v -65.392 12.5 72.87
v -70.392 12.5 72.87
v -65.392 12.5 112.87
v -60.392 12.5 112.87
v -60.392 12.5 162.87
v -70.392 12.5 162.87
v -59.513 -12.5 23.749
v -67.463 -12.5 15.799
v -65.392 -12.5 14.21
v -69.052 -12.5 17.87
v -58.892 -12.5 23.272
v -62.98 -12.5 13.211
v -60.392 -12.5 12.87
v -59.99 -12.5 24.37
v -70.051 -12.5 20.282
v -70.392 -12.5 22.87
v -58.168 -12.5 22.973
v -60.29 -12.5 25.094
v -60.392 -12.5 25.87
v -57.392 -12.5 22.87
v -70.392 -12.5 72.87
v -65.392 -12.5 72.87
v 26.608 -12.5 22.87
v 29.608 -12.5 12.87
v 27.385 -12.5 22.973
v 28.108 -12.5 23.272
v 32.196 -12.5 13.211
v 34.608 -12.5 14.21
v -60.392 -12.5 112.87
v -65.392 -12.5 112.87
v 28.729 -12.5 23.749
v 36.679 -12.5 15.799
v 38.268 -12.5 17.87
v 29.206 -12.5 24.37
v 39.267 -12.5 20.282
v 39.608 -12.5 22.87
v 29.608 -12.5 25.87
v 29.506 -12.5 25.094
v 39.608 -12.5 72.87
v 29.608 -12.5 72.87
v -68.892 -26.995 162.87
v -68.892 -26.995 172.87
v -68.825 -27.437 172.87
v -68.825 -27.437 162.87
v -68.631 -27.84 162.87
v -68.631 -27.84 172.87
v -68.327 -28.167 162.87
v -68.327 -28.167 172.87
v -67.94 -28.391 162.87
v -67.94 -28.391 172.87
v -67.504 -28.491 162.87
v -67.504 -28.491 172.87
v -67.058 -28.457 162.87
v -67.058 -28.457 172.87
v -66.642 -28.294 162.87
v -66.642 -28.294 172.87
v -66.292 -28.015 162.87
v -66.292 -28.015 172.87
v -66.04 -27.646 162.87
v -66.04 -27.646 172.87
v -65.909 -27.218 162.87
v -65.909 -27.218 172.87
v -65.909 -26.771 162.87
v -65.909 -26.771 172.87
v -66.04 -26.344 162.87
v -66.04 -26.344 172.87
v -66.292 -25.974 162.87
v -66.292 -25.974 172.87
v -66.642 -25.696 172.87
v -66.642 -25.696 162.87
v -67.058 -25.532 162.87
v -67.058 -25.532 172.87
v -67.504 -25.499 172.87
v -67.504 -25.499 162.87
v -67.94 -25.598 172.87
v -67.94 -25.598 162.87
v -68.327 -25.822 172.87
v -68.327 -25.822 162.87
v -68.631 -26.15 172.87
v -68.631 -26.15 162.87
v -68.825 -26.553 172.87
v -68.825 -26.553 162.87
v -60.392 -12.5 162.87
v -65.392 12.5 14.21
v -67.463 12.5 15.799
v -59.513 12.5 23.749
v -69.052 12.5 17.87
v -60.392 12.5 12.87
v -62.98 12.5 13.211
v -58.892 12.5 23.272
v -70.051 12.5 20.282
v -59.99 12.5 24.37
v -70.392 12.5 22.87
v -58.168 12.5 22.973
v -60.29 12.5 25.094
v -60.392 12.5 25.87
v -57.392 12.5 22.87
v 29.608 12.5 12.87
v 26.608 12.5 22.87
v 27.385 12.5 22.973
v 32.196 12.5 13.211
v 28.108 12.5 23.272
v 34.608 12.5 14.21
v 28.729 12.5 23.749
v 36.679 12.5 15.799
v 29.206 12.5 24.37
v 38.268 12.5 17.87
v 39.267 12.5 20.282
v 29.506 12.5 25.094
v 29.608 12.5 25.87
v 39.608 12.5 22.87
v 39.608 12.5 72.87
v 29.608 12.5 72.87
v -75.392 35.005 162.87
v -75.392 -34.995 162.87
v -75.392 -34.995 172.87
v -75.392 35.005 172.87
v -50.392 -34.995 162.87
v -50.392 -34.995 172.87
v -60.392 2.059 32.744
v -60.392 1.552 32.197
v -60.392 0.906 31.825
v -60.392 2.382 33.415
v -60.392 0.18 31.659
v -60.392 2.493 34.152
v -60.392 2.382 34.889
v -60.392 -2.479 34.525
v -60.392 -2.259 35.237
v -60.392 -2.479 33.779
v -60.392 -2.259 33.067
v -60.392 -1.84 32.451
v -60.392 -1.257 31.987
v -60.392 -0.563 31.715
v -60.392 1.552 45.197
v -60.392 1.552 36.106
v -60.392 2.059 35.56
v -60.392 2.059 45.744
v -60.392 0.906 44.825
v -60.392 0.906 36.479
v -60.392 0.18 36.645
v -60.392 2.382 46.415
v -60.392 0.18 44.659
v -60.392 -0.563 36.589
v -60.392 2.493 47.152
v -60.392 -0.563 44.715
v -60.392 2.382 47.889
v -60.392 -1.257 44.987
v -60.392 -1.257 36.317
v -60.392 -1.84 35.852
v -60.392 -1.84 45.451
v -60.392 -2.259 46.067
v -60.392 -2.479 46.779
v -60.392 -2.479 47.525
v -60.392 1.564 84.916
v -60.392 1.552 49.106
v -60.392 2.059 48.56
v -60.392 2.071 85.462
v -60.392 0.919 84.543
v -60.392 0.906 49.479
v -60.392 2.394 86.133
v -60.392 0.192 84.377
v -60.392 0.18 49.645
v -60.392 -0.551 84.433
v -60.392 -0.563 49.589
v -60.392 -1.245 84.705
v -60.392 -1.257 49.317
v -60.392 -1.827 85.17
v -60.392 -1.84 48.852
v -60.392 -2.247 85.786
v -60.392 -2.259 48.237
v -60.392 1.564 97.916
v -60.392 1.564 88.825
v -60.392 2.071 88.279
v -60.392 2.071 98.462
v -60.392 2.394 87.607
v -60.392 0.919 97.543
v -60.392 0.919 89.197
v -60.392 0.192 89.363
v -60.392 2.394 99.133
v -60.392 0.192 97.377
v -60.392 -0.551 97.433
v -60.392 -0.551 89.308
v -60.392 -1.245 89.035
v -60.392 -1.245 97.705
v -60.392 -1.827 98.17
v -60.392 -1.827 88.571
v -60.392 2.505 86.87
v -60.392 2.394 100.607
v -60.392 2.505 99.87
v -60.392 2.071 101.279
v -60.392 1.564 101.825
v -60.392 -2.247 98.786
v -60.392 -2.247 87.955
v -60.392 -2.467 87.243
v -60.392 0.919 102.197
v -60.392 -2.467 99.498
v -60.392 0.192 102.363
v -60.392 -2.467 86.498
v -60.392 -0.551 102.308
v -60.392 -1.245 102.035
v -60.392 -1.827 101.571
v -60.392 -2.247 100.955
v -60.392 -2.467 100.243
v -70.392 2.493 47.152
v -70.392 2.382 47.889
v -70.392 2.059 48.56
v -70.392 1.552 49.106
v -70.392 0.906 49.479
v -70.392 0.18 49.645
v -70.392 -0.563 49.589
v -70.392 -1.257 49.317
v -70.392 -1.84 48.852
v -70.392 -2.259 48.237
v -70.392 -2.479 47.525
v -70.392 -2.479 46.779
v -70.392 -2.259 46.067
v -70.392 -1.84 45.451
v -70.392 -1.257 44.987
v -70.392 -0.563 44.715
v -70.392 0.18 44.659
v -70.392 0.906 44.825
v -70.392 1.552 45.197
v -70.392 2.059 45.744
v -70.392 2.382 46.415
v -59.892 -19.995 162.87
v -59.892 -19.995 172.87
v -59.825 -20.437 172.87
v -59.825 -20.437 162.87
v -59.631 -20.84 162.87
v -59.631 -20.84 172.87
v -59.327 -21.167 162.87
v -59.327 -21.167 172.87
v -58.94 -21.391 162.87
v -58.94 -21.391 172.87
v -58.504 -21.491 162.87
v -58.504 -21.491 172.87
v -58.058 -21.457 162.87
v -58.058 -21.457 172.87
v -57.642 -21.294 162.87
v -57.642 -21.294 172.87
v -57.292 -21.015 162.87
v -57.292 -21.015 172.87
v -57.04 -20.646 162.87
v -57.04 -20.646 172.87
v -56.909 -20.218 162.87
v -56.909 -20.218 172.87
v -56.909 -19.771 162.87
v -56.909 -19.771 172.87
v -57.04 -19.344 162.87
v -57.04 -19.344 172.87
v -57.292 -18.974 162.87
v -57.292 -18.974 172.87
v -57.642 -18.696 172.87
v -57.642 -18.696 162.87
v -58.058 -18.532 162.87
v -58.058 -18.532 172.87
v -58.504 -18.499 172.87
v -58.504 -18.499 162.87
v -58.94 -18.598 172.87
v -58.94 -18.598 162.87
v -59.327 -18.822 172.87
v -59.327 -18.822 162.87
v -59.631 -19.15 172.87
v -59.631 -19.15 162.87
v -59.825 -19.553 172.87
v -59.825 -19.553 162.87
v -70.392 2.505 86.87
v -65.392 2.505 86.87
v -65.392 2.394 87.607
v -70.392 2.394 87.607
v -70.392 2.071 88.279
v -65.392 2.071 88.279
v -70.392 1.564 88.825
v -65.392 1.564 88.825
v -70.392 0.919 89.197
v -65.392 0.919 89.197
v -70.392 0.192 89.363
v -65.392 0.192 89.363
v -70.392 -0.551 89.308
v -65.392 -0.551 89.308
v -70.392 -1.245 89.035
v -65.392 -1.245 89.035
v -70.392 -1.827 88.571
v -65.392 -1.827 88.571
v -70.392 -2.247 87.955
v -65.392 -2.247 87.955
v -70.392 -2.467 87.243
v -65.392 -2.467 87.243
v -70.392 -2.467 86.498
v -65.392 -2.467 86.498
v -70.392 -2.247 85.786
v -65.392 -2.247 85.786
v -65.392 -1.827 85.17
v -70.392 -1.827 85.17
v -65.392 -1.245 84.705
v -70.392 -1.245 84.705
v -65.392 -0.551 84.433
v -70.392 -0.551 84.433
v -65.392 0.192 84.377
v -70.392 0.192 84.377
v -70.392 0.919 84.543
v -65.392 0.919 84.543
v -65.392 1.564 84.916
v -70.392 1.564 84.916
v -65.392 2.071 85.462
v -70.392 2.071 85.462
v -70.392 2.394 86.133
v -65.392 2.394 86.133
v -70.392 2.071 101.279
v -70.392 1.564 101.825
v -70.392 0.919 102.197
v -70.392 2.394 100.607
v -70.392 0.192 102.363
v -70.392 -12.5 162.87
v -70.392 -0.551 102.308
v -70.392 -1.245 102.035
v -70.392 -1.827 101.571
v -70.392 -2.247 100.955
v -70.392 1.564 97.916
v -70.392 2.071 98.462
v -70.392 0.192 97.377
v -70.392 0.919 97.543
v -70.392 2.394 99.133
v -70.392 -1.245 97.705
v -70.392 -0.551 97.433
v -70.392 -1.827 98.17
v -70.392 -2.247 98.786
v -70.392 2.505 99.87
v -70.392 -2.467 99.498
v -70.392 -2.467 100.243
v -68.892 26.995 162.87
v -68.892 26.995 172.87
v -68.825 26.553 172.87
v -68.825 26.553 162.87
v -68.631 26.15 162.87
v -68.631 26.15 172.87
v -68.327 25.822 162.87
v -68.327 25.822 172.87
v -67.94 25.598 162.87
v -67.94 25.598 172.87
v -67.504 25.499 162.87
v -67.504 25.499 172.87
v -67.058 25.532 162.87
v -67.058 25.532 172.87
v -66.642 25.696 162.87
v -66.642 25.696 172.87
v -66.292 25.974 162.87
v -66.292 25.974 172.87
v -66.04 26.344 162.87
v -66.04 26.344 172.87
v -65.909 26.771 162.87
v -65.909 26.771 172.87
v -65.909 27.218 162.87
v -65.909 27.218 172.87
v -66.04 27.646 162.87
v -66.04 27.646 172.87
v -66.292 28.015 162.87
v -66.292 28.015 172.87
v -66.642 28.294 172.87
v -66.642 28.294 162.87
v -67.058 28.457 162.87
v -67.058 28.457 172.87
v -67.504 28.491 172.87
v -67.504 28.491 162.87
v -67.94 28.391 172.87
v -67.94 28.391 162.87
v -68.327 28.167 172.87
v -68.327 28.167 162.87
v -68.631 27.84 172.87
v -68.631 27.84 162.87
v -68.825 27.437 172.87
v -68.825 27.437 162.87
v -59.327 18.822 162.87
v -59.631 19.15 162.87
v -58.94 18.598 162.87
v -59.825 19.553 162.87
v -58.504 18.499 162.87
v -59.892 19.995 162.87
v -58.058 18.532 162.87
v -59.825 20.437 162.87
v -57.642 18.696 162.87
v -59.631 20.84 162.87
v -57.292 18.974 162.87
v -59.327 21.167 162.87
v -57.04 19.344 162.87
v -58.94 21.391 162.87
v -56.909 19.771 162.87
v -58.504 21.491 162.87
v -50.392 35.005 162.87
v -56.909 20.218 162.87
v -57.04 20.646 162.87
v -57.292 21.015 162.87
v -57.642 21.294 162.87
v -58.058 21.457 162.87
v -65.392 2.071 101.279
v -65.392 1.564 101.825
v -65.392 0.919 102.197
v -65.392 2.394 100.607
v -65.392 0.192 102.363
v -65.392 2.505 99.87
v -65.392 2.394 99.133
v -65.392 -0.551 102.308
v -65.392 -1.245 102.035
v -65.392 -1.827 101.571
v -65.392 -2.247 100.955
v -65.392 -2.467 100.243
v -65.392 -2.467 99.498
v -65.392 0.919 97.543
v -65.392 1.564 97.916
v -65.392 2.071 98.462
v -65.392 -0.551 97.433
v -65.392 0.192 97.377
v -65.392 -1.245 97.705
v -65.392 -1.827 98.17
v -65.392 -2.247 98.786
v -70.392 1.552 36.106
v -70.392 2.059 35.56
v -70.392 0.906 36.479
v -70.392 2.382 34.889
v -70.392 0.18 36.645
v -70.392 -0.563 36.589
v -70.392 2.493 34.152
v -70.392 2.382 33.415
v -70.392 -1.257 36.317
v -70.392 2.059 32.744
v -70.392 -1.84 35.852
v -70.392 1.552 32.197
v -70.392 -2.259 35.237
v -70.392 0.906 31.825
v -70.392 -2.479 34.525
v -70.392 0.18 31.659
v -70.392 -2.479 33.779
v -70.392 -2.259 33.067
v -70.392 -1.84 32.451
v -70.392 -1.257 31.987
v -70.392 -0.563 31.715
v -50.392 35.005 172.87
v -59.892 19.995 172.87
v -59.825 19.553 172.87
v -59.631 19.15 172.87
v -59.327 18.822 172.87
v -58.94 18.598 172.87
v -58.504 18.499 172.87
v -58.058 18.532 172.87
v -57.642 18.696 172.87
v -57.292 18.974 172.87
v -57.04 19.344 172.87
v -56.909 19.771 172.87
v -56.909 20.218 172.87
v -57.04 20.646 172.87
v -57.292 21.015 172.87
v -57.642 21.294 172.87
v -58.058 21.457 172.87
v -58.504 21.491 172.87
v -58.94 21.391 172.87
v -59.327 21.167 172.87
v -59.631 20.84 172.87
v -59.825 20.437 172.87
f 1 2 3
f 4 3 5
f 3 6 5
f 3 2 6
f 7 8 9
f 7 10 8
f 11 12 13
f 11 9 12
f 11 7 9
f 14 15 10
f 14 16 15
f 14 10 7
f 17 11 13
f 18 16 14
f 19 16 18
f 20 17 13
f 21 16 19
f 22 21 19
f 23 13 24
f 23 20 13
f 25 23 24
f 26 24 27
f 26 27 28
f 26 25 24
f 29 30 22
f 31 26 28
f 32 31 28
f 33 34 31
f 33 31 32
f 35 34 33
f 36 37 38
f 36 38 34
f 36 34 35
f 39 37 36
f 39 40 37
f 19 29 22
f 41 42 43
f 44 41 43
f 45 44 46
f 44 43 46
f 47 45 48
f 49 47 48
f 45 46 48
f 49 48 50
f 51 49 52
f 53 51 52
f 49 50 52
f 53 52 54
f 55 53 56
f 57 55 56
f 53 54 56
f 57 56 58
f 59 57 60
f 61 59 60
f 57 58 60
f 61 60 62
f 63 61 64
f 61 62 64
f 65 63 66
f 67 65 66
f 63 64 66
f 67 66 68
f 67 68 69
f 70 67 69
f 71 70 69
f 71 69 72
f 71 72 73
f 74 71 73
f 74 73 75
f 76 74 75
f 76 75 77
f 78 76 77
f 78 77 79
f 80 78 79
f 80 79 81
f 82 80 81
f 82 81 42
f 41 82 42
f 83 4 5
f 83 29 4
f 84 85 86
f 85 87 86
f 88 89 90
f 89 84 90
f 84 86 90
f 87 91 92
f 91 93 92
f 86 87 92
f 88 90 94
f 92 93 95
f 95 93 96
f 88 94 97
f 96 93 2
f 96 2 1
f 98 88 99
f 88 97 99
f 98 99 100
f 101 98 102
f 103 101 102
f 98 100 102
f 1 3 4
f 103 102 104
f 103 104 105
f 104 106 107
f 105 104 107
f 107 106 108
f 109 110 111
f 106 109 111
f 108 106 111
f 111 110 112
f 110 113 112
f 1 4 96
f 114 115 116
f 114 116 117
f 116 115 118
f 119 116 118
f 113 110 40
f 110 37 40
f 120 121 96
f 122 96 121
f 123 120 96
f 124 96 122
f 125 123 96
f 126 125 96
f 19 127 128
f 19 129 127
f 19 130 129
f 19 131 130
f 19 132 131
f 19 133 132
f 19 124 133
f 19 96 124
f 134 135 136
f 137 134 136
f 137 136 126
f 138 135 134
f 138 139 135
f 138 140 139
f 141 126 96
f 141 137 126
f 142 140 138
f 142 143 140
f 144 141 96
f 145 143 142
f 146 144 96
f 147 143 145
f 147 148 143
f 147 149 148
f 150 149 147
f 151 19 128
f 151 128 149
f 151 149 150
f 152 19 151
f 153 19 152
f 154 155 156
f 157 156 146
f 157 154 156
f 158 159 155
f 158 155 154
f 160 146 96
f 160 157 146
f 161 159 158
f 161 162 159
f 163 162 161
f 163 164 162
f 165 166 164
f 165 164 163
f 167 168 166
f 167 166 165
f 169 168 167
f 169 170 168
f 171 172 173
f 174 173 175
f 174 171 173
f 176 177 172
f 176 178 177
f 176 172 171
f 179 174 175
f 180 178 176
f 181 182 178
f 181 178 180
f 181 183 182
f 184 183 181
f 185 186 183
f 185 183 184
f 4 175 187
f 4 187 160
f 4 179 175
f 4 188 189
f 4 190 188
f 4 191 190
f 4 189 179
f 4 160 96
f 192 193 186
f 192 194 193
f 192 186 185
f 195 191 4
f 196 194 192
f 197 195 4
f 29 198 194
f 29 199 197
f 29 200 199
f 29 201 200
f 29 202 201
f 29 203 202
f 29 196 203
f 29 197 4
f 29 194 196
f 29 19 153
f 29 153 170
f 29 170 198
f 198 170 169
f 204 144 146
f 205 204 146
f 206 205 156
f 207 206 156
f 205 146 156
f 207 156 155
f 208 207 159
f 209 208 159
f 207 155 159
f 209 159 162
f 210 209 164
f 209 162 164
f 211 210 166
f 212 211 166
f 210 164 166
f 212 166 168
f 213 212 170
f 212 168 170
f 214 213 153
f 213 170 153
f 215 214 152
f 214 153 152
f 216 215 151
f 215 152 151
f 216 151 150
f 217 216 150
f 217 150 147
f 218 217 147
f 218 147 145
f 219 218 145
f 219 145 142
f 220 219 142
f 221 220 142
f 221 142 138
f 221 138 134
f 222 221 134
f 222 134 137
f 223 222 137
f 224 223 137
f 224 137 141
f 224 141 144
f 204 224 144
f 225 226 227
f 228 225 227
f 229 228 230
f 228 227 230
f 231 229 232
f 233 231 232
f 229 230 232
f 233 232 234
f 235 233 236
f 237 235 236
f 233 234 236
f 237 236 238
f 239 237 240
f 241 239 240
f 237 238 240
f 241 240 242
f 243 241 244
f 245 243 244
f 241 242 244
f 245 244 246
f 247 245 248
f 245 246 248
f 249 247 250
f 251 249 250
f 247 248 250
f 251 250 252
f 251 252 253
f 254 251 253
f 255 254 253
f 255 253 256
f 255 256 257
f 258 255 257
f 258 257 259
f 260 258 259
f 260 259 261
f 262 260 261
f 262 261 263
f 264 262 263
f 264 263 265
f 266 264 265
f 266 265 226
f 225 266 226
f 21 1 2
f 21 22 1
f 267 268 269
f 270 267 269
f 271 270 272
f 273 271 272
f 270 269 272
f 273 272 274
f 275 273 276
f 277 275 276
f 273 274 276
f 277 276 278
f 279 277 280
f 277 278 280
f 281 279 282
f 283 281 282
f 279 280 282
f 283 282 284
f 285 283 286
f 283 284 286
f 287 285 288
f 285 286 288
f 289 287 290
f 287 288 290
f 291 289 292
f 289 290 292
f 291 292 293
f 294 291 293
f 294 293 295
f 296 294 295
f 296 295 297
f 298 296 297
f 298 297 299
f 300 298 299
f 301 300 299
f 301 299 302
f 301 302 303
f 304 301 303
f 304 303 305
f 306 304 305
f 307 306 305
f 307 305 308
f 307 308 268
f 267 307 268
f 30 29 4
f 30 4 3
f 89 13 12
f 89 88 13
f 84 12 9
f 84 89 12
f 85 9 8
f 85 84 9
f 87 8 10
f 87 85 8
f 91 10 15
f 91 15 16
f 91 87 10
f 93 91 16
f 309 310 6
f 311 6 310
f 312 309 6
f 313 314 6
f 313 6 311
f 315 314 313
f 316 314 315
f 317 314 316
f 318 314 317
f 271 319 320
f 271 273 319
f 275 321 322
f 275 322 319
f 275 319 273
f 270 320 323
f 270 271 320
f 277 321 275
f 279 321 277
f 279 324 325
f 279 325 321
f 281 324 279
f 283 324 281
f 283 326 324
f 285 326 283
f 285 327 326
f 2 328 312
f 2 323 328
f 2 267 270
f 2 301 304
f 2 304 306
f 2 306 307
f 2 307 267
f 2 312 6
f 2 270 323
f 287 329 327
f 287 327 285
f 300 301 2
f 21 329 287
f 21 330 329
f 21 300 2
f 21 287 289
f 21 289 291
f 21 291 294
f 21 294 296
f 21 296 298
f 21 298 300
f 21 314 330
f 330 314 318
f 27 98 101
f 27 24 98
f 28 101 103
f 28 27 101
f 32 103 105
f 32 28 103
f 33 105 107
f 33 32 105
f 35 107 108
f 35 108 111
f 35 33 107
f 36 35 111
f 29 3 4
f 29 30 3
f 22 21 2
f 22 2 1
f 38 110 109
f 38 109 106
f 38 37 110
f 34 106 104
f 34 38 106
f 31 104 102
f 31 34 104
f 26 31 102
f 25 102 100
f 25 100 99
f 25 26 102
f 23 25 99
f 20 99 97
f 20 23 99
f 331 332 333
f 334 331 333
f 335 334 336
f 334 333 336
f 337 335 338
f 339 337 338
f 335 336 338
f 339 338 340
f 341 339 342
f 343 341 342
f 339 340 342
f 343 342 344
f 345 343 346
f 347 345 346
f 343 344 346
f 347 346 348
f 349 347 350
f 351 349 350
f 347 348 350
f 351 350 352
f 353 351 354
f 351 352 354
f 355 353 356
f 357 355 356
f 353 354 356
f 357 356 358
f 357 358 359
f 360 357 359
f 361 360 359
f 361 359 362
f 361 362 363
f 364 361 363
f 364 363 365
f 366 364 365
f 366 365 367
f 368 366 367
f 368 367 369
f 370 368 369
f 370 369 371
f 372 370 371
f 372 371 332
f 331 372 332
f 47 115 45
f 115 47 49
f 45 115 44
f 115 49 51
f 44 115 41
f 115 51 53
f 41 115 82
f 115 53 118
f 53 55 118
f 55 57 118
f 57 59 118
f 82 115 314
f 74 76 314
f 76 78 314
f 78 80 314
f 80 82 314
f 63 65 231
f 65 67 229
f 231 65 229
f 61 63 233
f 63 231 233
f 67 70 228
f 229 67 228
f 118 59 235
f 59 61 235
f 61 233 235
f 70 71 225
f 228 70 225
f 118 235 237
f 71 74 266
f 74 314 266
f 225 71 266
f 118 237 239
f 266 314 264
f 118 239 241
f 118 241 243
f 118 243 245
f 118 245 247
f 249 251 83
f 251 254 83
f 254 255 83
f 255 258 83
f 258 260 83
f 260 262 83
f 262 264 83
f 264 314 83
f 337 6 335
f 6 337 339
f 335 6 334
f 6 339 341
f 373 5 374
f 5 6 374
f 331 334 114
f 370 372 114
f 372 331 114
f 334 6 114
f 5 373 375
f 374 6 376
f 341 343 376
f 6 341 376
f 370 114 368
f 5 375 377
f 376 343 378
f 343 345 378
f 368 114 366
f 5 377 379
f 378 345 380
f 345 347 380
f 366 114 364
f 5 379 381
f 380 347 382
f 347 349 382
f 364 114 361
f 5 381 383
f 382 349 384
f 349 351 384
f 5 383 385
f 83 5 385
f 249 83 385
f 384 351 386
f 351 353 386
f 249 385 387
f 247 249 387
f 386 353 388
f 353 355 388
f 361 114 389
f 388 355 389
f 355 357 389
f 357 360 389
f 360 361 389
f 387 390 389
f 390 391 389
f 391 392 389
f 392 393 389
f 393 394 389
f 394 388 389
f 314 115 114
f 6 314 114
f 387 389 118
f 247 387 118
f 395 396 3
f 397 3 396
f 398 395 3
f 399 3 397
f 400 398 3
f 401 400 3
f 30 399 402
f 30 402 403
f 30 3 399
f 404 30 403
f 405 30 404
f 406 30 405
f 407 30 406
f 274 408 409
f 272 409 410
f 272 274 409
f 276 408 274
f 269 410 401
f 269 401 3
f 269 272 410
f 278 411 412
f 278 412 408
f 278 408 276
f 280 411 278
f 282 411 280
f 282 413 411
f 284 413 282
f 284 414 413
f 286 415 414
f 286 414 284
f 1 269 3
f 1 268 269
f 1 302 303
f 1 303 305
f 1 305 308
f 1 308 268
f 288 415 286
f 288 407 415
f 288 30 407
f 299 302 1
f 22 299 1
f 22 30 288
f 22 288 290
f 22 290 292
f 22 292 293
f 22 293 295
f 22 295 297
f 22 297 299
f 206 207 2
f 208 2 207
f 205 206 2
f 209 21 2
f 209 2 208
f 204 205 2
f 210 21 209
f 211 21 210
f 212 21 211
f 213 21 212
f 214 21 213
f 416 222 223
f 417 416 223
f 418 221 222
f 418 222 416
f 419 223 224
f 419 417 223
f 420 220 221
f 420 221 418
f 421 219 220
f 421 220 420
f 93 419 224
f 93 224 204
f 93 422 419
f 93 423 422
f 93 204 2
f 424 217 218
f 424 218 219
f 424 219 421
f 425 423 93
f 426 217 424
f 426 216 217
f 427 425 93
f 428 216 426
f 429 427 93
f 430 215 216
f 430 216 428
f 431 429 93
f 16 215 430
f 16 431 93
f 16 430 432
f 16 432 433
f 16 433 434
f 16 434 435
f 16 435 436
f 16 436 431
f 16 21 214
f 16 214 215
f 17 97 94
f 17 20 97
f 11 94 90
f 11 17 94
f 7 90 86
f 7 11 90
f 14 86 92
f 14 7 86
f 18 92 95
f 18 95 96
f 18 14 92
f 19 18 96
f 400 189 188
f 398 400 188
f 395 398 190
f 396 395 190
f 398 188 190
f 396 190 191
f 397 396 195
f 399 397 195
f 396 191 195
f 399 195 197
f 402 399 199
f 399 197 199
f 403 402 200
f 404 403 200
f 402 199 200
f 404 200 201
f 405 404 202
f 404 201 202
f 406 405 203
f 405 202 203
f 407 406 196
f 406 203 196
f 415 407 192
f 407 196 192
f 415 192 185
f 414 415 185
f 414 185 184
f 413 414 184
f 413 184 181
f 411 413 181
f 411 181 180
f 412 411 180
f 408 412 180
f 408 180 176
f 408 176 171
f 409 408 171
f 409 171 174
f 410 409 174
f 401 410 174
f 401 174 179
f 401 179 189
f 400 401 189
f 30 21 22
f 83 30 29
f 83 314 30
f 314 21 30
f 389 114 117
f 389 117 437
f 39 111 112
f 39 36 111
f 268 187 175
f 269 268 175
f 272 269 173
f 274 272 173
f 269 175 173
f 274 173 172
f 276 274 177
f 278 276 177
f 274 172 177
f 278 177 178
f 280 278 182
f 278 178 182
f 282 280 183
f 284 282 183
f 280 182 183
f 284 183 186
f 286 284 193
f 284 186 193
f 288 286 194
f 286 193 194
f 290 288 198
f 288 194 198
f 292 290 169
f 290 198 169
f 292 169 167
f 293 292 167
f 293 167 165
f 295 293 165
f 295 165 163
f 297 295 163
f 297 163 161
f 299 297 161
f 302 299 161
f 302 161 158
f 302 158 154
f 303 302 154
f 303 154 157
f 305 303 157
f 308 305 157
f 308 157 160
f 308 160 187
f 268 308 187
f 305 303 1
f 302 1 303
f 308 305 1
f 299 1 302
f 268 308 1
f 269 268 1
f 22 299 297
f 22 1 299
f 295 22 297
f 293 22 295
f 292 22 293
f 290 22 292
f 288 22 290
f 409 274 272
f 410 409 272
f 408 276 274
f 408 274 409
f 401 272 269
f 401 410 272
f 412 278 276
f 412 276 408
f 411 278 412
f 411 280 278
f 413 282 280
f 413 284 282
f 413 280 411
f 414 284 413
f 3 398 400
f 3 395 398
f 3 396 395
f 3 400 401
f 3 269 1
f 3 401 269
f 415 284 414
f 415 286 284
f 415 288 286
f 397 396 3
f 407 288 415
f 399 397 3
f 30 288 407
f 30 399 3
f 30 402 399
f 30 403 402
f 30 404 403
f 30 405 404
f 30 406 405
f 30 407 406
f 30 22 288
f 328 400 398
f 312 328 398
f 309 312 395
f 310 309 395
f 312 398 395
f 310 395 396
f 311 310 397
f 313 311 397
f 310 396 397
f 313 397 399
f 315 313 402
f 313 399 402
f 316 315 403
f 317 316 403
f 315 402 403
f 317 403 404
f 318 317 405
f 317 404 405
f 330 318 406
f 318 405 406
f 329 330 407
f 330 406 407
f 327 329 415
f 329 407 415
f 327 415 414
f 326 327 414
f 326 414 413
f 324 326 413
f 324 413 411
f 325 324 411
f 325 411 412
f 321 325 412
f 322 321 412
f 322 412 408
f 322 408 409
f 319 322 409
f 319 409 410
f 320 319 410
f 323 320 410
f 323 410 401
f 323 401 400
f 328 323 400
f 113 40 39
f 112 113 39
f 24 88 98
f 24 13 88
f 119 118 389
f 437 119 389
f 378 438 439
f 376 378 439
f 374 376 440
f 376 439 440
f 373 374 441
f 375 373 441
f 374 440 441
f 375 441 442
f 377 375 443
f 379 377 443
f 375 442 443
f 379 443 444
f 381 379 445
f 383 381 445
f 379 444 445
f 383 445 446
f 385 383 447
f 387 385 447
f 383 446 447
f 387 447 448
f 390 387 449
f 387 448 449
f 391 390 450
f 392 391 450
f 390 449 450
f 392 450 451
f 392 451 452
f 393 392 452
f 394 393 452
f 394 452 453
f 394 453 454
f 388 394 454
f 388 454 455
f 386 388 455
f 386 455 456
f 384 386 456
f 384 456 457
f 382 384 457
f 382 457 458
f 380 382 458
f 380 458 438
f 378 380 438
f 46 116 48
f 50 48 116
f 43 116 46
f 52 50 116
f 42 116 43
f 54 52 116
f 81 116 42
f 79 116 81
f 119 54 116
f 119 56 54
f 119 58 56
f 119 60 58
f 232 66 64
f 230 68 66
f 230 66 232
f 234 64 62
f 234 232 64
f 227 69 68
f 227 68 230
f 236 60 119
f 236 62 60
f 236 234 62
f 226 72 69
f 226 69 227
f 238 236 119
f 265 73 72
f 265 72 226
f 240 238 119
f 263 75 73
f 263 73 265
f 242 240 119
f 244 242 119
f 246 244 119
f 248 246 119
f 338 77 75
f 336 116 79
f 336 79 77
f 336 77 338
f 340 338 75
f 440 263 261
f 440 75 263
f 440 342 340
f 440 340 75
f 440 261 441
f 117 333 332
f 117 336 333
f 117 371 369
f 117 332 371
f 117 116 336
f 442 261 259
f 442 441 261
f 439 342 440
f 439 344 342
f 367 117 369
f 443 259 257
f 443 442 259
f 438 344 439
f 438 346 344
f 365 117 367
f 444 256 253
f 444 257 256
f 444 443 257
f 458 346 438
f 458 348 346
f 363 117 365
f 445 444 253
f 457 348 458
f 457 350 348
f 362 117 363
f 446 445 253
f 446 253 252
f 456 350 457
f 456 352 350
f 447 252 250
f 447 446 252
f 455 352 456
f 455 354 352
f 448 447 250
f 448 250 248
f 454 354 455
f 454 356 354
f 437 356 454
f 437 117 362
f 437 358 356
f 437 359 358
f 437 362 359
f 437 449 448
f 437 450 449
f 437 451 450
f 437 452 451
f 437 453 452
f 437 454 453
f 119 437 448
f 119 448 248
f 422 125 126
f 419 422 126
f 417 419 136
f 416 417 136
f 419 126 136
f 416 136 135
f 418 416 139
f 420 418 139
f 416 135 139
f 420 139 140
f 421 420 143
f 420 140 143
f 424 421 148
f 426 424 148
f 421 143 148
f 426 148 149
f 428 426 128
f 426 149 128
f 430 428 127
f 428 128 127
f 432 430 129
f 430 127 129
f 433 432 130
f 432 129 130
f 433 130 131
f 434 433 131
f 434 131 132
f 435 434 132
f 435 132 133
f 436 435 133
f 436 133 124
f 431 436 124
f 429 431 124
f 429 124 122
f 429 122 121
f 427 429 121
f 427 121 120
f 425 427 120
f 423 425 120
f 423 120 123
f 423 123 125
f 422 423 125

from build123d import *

# Parameters (mm, degrees)
F0_W       = 10
F0_H       = 50
F1_DEPTH   = 12.5
F0_W_2     = 5
F0_H_2     = 40
F2_DEPTH   = 12.5
F4_D       = 5
F4_DEPTH   = 30
F4_TIP     = 1.5021515476
F4_2_D     = 5
F4_2_DEPTH = 30
F4_2_TIP   = 1.5021515476
F5_W       = 25
F5_H       = 70
F5_W_2     = 10
F5_H_2     = 25
F6_DEPTH   = 10
F7_D       = 3
F8_R       = 10
F9_R       = 3


with BuildPart() as f1:
    # F0 (on Front) → F1 (new body, symmetric)
    with BuildSketch(Plane.XZ):
        Polygon((-70.3919455409, 12.8702814982), (-60.3919455409, 12.8702814982), (-60.3919455409, 22.8702814982), (-60.3919455409, 112.8702814982), (-65.3919455409, 112.8702814982), (-65.3919455409, 72.8702814982), (-70.3919455409, 72.8702814982), align=None)
        Polygon((-60.3919455409, 12.8702814982), (39.6080544591, 12.8702814982), (39.6080544591, 22.8702814982), (29.6080544591, 22.8702814982), (-60.3919455409, 22.8702814982), align=None)
        with Locations((34.6080544591, 47.8702814982)):
            Rectangle(F0_W, F0_H)
    extrude(amount=F1_DEPTH, both=True)

    # F4
    with Locations(Plane(origin=(-70.3919455409, 0, 0), x_dir=(0, -1, 0), z_dir=(-1, 0, 0))):
        with Locations((-0.0052508735, 99.8702814982), (-0.0052508735, 86.8702814982), (0.0070159344, 47.1519191861), (0.0070159344, 34.1519191861)):
            Hole(F4_D / 2, depth=F4_DEPTH)
            with Locations((0, 0, -(F4_DEPTH + F4_TIP / 2))):  # 118° drill point
                Cone(0, F4_D / 2, F4_TIP, mode=Mode.SUBTRACT)

    # F8
    f8_edges = [f1.edges().sort_by_distance(p)[0] for p in [
        (-70.391946, 0, 12.870281),
        (39.608054, 0, 12.870281),
    ]]
    fillet(f8_edges, radius=F8_R)

    # F9
    f9_edges = [f1.edges().sort_by_distance(p)[0] for p in [
        (29.608054, 0, 22.870281),
        (-60.391946, 0, 22.870281),
    ]]
    fillet(f9_edges, radius=F9_R)


with BuildPart() as f2:
    # F0 (on Front) → F2 (new body, symmetric)
    with BuildSketch(Plane.XZ):
        Polygon((-65.3919455409, 112.8702814982), (-60.3919455409, 112.8702814982), (-60.3919455409, 162.8702814982), (-70.3919455409, 162.8702814982), (-70.3919455409, 112.8702814982), align=None)
        with Locations((-67.8919455409, 92.8702814982)):
            Rectangle(F0_W_2, F0_H_2)
    extrude(amount=F2_DEPTH, both=True)

    # F4#2
    with Locations(Plane(origin=(-70.3919455409, 0, 0), x_dir=(0, -1, 0), z_dir=(-1, 0, 0))):
        with Locations((-0.0052508735, 99.8702814982), (-0.0052508735, 86.8702814982), (0.0070159344, 47.1519191861), (0.0070159344, 34.1519191861)):
            Hole(F4_2_D / 2, depth=F4_2_DEPTH)
            with Locations((0, 0, -(F4_2_DEPTH + F4_2_TIP / 2))):  # 118° drill point
                Cone(0, F4_2_D / 2, F4_2_TIP, mode=Mode.SUBTRACT)

    # F5 (on face) → F6 (join)
    with BuildSketch(Plane.XY.offset(162.8702814982)):
        with Locations((-62.8919455409, 0.0052508735)):
            Rectangle(F5_W, F5_H)
        with Locations((-65.3919455409, 0)):
            Rectangle(F5_W_2, F5_H_2, mode=Mode.SUBTRACT)
        with Locations((-65.3919455409, 0)):
            Rectangle(F5_W_2, F5_H_2)
    extrude(amount=F6_DEPTH)

    # F7 (through all)
    with Locations(Plane(origin=(0, 0, 162.8702814982), x_dir=(1, 0, 0), z_dir=(0, 0, -1))):
        with Locations((-58.3919455409, -19.9947491265), (-67.3919455409, -26.9947491265), (-58.3919455409, 19.9947491265), (-67.3919455409, 26.9947491265)):
            Hole(F7_D / 2)


solid = Compound([f1.part, f2.part])
